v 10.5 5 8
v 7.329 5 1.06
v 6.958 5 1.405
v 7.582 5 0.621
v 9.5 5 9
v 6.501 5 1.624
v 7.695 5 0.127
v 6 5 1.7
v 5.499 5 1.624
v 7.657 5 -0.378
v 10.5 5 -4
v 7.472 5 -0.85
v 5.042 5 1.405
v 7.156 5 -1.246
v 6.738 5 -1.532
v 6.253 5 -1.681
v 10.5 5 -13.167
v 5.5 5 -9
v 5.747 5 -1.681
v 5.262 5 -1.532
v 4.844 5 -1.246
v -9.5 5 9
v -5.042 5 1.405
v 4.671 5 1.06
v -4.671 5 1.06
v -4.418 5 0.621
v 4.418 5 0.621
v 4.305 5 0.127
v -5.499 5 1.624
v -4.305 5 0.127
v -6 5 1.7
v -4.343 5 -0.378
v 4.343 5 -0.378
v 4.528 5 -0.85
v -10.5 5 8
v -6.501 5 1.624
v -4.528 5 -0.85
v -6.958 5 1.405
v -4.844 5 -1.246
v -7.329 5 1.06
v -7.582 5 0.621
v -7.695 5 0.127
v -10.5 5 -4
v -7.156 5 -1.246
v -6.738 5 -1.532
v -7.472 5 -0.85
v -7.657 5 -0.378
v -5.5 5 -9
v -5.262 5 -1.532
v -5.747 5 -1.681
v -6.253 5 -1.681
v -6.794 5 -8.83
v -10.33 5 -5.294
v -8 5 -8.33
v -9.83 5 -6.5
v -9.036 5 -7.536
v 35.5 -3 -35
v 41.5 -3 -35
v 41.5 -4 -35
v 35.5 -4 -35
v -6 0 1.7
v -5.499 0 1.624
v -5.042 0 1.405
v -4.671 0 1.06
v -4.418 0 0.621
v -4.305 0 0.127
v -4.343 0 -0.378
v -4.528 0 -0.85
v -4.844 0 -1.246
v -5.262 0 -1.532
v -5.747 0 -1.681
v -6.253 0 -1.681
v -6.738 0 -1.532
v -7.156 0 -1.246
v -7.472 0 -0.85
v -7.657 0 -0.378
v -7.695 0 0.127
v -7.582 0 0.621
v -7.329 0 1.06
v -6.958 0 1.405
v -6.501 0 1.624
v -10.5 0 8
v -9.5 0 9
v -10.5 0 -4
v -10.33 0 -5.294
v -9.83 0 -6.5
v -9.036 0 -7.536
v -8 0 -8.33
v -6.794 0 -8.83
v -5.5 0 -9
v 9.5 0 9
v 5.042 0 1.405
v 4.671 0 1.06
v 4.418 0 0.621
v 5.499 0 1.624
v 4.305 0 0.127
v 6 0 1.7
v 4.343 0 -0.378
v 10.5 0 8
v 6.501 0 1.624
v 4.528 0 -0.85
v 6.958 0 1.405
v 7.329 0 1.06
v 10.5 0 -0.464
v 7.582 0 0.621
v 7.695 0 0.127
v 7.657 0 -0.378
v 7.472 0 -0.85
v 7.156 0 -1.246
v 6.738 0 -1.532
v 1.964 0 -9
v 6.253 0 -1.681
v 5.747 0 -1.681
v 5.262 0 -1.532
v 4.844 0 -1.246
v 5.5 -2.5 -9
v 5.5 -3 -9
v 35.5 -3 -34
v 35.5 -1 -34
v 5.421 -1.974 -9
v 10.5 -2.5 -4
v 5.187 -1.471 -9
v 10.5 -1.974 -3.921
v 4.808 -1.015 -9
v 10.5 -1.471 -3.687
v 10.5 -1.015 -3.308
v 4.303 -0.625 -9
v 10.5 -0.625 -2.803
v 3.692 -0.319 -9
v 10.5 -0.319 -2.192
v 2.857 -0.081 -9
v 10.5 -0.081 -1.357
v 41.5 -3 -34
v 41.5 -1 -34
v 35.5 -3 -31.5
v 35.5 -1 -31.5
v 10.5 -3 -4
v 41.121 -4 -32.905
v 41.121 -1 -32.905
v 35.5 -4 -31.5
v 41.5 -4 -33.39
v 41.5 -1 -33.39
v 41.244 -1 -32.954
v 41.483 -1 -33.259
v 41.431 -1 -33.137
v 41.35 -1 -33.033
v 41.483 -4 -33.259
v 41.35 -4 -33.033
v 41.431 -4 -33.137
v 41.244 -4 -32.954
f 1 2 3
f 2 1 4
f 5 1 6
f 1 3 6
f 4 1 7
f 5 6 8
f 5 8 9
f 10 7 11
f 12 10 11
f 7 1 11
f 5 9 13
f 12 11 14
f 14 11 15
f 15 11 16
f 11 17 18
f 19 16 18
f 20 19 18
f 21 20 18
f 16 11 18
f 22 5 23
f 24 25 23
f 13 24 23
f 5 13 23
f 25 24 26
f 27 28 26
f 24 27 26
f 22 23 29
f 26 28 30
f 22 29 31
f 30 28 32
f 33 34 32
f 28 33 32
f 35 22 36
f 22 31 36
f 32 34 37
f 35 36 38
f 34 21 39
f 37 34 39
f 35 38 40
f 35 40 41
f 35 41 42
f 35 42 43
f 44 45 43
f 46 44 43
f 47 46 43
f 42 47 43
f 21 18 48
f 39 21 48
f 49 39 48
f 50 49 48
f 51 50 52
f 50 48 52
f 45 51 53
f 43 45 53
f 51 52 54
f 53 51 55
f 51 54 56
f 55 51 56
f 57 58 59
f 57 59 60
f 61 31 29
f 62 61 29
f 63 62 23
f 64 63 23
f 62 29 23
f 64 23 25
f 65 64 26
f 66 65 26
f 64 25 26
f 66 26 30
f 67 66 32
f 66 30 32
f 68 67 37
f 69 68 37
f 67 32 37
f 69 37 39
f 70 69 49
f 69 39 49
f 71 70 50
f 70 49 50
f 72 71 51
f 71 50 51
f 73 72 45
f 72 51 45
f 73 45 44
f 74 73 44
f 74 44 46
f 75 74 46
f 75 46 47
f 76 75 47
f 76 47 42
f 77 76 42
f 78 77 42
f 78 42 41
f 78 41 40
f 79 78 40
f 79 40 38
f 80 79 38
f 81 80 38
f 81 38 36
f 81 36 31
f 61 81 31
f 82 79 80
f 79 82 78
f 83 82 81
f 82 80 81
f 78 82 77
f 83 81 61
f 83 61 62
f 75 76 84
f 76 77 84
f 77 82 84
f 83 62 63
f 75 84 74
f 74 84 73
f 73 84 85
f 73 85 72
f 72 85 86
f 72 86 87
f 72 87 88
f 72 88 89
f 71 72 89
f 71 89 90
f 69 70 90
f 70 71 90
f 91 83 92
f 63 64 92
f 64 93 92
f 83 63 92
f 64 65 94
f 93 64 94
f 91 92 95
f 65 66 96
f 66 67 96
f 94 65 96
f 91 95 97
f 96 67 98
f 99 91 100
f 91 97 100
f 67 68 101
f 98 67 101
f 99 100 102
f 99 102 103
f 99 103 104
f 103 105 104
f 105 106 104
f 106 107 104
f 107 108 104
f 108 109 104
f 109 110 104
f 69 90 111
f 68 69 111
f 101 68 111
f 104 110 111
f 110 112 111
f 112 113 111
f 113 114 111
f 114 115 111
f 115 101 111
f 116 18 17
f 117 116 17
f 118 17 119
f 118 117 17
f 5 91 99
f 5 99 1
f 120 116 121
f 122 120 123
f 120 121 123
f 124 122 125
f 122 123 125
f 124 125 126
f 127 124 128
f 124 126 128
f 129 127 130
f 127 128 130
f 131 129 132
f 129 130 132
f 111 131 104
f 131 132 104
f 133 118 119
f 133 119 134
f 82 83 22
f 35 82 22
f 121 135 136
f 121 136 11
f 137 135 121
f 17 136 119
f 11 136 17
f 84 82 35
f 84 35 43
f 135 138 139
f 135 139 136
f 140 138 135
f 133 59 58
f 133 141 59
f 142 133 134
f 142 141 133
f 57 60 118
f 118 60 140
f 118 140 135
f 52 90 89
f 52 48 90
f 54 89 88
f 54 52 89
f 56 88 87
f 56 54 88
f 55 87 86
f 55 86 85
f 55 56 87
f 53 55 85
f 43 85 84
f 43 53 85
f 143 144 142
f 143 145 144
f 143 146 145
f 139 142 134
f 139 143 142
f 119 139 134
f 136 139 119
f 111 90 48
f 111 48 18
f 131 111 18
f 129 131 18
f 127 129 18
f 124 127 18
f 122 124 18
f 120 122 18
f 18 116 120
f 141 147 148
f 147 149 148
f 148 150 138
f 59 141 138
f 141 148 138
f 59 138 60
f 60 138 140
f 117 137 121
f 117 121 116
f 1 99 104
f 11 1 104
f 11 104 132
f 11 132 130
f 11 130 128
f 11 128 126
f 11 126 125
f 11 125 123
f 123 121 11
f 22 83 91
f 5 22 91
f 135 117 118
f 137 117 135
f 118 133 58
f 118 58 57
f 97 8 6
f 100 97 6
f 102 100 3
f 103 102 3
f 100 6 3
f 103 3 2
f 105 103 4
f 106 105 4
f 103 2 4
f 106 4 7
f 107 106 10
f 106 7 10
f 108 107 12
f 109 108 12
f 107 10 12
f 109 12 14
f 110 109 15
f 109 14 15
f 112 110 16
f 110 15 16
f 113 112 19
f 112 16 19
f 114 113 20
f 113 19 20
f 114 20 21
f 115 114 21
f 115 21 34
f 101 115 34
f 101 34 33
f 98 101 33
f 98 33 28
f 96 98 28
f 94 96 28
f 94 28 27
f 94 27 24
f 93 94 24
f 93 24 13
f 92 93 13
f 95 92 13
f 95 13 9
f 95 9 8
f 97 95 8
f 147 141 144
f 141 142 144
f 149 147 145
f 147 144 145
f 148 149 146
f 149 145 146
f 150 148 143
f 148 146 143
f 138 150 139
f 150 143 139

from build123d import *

# Parameters (mm, degrees)
SKETCH_2_W          = 21
SKETCH_2_H          = 18
EXTRUDE_2_DEPTH     = 5
EXTRUDE_3_DEPTH     = 9
SKETCH_4_W          = 30
SKETCH_4_H          = 1
CUT_EXTRUDE_1_DEPTH = 60.968741858
FILLET_1_R          = 0.5
FILLET_2_R          = 2.5
FILLET_3_R          = 5
CHAMFER_1_SIZE      = 1
SKETCH_5_R          = 1.7
CUT_EXTRUDE_2_DEPTH = 55.398988961
SKETCH_6_W          = 6
SKETCH_6_H          = 1
EXTRUDE_4_DEPTH     = 1


with BuildPart() as part:
    # ｽｹｯﾁ2 → ﾎﾞｽ - 押し出し2 (new body)
    with BuildSketch(Plane(origin=(0, 0, 0), x_dir=(1, 0, 0), z_dir=(0, 1, 0))):
        Rectangle(SKETCH_2_W, SKETCH_2_H)
    extrude(amount=EXTRUDE_2_DEPTH)

    # ｽｹｯﾁ3 → ﾎﾞｽ - 押し出し3 (add)
    with BuildSketch(Plane(origin=(0, -4, 0), x_dir=(-1, 0, 0), z_dir=(0, -1, 0))):
        Polygon((-5.5, 9), (-35.5, 34), (-41.5, 34), (-41.5, 33), (-35.5, 31.5), (-10.5, 4), align=None)
    extrude(amount=-EXTRUDE_3_DEPTH)

    # ｽｹｯﾁ4 → ｶｯﾄ - 押し出し1 (cut, through all)
    with BuildSketch(Plane.XY.offset(9)):
        Polygon((35.5, -1), (10.5, 5), (41.5, 5), (41.5, -1), align=None)
        with Locations((20.5, -3.5)):
            Rectangle(SKETCH_4_W, SKETCH_4_H)
    extrude(amount=-CUT_EXTRUDE_1_DEPTH, mode=Mode.SUBTRACT)

    # ﾌｨﾚｯﾄ1
    fillet_1_edges = [part.edges().sort_by_distance(p)[0] for p in [
        (41.5, -2.5, -33),
    ]]
    fillet(fillet_1_edges, radius=FILLET_1_R)

    # ﾌｨﾚｯﾄ2
    fillet_2_edges = [part.edges().sort_by_distance(p)[0] for p in [
        (8, 0, -6.5),
    ]]
    fillet(fillet_2_edges, radius=FILLET_2_R)

    # ﾌｨﾚｯﾄ3
    fillet_3_edges = [part.edges().sort_by_distance(p)[0] for p in [
        (-10.5, 2.5, -9),
    ]]
    fillet(fillet_3_edges, radius=FILLET_3_R)

    # 面取り1
    chamfer_1_edges = [part.edges().sort_by_distance(p)[0] for p in [
        (10.5, 2.5, 9),
        (-10.5, 2.5, 9),
    ]]
    chamfer(chamfer_1_edges, length=CHAMFER_1_SIZE)

    # ｽｹｯﾁ5 → ｶｯﾄ - 押し出し2 (cut, through all)
    with BuildSketch(Plane(origin=(0, 5, 0), x_dir=(1, 0, 0), z_dir=(0, 1, 0))):
        with Locations(Location((6, 0, 0), (0, 0, 270))):
            Circle(SKETCH_5_R)
        with Locations(Location((-6, 0, 0), (0, 0, 270))):
            Circle(SKETCH_5_R)
    extrude(amount=-CUT_EXTRUDE_2_DEPTH, mode=Mode.SUBTRACT)

    # ｽｹｯﾁ6 → ﾎﾞｽ - 押し出し4 (add)
    with BuildSketch(Plane(origin=(0, 0, -34), x_dir=(-1, 0, 0), z_dir=(0, 0, -1))):
        with Locations((-38.5, -3.5)):
            Rectangle(SKETCH_6_W, SKETCH_6_H)
    extrude(amount=EXTRUDE_4_DEPTH)


solid = part.part
